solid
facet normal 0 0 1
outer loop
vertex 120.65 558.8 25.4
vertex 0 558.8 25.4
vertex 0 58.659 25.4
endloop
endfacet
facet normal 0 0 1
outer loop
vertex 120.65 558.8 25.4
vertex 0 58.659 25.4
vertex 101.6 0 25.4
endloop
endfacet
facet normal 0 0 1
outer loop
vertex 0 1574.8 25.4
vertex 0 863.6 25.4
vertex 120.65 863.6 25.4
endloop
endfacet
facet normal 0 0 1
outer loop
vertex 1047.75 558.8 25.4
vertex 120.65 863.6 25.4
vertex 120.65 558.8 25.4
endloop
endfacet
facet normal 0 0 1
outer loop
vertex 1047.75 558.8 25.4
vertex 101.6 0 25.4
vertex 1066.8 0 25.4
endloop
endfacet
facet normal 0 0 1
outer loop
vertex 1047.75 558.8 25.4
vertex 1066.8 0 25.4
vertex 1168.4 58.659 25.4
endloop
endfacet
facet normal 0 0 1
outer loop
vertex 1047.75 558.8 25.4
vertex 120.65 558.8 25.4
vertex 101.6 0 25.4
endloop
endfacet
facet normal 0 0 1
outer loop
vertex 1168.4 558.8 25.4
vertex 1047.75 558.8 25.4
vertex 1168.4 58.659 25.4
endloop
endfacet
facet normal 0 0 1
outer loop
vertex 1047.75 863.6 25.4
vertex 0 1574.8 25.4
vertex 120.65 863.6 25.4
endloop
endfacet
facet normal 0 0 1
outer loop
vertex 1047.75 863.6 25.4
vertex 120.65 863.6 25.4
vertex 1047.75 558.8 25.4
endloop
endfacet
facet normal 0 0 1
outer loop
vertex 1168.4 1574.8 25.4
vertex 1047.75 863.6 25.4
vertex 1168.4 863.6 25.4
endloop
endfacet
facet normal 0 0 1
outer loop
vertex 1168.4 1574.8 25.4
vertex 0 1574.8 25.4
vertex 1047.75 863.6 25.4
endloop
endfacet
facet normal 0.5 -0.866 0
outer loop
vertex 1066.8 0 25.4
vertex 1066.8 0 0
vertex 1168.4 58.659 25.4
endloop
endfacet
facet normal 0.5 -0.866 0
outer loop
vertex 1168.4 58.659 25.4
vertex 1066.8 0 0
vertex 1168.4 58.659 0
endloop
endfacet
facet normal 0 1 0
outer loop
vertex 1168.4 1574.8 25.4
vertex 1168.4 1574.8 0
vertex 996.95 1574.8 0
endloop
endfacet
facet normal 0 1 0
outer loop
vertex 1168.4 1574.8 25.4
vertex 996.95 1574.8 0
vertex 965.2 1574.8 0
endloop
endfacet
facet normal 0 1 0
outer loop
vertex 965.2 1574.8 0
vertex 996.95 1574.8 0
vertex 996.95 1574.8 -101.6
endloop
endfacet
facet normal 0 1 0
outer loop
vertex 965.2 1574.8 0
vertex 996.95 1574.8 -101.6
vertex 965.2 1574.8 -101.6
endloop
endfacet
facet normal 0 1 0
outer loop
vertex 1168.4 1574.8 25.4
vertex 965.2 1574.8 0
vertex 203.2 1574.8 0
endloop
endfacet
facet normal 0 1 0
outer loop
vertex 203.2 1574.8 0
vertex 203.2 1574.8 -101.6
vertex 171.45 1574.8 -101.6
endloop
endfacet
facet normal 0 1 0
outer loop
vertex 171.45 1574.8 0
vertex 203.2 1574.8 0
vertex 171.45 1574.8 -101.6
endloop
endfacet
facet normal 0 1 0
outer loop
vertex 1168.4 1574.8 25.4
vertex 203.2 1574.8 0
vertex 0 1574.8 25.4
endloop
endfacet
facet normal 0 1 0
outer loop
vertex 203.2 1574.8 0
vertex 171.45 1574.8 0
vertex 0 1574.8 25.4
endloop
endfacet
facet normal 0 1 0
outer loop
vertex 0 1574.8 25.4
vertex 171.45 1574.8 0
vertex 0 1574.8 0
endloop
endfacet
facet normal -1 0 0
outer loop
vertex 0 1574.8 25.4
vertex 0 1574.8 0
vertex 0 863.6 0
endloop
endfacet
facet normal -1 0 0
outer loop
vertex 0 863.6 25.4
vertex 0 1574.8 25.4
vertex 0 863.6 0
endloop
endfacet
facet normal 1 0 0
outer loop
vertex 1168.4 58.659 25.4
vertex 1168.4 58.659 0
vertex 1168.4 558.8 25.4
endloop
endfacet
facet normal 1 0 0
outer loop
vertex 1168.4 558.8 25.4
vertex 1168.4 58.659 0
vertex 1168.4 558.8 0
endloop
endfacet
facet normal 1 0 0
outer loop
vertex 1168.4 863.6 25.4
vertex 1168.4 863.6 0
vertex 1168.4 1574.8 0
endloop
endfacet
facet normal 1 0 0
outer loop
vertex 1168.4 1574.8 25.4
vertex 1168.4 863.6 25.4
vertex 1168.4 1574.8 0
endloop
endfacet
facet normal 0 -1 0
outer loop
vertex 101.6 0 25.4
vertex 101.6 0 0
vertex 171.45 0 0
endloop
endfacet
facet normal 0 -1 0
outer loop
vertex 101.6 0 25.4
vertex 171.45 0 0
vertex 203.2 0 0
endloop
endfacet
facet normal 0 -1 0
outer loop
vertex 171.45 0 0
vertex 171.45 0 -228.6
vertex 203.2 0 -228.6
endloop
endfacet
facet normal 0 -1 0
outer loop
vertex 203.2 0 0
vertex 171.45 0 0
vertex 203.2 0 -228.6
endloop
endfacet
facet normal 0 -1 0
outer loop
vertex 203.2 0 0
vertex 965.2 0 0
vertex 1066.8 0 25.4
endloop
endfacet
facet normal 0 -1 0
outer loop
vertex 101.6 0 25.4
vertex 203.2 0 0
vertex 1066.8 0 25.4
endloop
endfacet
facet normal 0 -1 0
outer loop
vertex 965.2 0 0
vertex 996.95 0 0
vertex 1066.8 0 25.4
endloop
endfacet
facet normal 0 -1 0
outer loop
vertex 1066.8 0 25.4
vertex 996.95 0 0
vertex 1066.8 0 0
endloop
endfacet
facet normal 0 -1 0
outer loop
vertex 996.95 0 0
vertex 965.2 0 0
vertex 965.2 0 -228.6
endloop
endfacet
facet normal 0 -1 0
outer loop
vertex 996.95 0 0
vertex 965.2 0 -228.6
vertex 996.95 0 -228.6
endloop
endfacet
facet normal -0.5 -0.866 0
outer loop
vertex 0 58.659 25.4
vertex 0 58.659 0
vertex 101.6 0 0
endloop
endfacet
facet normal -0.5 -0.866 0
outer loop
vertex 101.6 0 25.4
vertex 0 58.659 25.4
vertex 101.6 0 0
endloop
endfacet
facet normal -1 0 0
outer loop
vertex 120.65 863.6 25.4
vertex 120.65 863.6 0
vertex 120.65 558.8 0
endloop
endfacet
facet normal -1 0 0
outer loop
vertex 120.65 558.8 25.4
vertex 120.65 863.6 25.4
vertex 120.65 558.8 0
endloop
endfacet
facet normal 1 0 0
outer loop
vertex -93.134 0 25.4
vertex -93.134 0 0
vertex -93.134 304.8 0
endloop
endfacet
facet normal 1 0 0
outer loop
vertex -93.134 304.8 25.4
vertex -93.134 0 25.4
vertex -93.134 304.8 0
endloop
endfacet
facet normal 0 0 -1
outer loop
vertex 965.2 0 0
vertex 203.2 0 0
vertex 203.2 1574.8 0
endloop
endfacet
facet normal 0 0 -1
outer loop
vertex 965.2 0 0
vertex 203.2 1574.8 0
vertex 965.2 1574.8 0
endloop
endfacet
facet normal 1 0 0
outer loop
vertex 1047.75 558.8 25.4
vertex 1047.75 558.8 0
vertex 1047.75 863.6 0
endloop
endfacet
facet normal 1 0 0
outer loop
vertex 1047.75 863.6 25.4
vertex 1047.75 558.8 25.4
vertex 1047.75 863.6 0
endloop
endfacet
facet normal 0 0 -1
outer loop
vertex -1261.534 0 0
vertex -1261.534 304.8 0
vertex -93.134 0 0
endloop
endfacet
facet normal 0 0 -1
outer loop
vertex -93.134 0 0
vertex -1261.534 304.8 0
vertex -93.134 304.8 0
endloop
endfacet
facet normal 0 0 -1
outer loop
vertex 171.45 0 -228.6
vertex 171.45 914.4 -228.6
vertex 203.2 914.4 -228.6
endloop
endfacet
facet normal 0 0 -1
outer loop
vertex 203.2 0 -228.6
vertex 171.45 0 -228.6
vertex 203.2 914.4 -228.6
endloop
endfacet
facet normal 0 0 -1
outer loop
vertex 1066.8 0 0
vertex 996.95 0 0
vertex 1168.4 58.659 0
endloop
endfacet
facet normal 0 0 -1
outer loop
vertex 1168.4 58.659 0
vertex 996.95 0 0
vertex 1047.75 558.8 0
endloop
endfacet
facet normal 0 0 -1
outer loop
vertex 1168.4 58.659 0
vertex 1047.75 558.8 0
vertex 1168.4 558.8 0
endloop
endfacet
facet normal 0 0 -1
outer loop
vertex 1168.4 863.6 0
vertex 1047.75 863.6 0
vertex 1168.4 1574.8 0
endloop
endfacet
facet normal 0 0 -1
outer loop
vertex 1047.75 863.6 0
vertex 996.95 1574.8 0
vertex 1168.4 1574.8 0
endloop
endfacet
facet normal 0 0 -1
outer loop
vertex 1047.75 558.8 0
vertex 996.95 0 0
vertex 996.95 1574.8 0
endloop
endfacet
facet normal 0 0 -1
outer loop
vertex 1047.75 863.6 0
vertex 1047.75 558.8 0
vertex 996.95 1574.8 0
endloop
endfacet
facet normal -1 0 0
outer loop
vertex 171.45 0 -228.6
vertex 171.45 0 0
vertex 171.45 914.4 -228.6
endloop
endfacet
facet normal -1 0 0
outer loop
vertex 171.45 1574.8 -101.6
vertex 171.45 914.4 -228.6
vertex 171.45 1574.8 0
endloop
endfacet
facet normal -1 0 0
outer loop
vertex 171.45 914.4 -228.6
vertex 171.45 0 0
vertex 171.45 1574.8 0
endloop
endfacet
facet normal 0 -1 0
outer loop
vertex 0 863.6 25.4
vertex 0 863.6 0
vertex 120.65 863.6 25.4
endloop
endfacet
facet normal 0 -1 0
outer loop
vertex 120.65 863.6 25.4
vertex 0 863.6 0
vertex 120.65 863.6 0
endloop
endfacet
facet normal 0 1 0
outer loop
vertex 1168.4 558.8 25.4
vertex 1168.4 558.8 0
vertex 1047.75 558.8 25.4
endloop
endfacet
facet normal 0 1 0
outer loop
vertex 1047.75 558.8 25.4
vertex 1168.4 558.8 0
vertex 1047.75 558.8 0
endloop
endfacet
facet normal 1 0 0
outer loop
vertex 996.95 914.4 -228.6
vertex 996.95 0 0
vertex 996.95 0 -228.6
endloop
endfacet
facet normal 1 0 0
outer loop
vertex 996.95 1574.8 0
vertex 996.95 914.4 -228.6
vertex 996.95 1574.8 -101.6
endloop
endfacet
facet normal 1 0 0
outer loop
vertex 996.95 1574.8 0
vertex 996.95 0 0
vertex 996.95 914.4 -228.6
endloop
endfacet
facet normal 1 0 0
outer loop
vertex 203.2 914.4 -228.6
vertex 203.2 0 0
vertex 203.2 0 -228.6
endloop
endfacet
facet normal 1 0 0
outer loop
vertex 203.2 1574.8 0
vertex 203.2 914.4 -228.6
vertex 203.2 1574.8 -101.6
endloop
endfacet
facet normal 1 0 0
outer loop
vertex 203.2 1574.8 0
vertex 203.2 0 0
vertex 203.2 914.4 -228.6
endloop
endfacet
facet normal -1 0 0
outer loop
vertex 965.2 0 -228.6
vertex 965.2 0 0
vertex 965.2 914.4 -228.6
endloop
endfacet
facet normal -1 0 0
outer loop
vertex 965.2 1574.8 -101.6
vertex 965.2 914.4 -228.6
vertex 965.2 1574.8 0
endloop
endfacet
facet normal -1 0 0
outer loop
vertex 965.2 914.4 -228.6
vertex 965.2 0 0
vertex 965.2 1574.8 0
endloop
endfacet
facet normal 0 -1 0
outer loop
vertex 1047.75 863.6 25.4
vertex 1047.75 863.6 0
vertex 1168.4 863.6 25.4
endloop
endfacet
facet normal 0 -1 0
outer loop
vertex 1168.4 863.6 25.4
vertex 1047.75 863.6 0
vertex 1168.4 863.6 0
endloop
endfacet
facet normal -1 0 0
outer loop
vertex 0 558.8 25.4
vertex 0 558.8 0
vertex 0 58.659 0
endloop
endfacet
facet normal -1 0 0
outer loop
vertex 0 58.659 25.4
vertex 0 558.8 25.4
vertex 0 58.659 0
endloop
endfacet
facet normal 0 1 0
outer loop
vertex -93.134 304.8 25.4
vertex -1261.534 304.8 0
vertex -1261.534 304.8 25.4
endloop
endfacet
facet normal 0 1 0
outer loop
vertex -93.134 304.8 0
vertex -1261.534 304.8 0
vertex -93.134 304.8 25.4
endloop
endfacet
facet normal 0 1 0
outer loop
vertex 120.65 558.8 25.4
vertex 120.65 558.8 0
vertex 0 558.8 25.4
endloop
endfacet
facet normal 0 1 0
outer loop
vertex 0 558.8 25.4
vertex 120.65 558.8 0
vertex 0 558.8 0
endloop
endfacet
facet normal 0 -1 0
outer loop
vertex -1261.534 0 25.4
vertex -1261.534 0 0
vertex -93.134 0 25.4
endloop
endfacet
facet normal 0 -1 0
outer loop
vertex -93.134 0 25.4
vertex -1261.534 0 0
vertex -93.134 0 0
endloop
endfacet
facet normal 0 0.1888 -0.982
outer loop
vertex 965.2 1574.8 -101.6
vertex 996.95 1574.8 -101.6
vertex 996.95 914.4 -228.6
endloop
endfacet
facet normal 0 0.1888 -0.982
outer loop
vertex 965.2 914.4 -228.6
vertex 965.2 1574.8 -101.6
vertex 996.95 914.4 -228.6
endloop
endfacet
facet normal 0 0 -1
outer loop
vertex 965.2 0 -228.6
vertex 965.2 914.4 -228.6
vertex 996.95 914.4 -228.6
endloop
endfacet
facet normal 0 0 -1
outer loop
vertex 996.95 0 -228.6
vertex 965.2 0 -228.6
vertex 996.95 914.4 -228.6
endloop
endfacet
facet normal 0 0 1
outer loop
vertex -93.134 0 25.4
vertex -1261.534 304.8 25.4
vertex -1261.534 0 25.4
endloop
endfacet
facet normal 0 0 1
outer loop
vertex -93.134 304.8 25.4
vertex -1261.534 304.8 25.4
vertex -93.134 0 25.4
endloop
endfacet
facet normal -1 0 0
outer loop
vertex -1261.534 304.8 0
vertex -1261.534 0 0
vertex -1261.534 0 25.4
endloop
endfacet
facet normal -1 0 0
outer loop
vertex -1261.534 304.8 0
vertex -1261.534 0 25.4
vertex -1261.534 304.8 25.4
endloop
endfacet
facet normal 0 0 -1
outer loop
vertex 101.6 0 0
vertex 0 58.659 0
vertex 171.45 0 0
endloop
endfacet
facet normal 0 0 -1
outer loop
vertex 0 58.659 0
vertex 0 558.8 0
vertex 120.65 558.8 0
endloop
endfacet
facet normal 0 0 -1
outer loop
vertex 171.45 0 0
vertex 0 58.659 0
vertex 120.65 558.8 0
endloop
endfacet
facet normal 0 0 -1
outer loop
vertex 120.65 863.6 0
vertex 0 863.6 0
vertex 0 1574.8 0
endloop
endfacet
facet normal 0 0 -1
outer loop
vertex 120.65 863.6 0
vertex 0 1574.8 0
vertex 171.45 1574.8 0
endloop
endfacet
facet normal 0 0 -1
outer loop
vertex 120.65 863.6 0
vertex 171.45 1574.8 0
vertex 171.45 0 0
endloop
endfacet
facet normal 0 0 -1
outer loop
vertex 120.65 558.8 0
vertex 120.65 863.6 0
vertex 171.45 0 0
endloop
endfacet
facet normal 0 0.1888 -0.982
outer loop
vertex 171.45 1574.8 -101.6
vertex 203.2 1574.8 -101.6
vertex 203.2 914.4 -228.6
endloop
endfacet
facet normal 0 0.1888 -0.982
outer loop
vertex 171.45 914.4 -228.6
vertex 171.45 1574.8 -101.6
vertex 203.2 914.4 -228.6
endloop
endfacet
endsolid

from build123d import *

# Parameters (mm, degrees)
F0_W     = 762
F0_H     = 1574.8
F0_W_2   = 31.75
F1_DEPTH = 25.4
F2_DEPTH = 228.6
F3_W     = 1168.4
F3_H     = 304.8
F4_DEPTH = 25.4
F6_DEPTH = 2540


with BuildPart() as f1:
    # F0 (on Top) → F1 (new body)
    with BuildSketch(Plane.XY):
        with Locations((584.2, 787.4)):
            Rectangle(F0_W, F0_H)
        with Locations((981.075, 787.4)):
            Rectangle(F0_W_2, F0_H)
        Polygon((0, 58.658787), (101.6, 0), (171.45, 0), (171.45, 1574.8), (0, 1574.8), (0, 863.6), (120.65, 863.6), (120.65, 558.8), (0, 558.8), align=None)
        with Locations((187.325, 787.4)):
            Rectangle(F0_W_2, F0_H)
        Polygon((996.95, 1574.8), (996.95, 0), (1066.8, 0), (1168.4, 58.658787), (1168.4, 558.8), (1047.75, 558.8), (1047.75, 863.6), (1168.4, 863.6), (1168.4, 1574.8), align=None)
    extrude(amount=F1_DEPTH)

    # F0 (on Top) → F2 (join)
    with BuildSketch(Plane.XY):
        with Locations((187.325, 787.4)):
            Rectangle(F0_W_2, F0_H)
        with Locations((981.075, 787.4)):
            Rectangle(F0_W_2, F0_H)
    extrude(amount=-F2_DEPTH)

    # F5 (on face) → F6 (cut)
    with BuildSketch(Plane.YZ.offset(996.95)):
        Polygon((1574.8, -101.6), (914.4, -228.6), (1574.8, -228.6), align=None)
    extrude(amount=-F6_DEPTH, mode=Mode.SUBTRACT)


with BuildPart() as f4:
    # F3 (on Top) → F4 (new body)
    with BuildSketch(Plane.XY):
        with Locations((-677.334176, 152.4)):
            Rectangle(F3_W, F3_H)
    extrude(amount=F4_DEPTH)


solid = Compound([f1.part, f4.part])
